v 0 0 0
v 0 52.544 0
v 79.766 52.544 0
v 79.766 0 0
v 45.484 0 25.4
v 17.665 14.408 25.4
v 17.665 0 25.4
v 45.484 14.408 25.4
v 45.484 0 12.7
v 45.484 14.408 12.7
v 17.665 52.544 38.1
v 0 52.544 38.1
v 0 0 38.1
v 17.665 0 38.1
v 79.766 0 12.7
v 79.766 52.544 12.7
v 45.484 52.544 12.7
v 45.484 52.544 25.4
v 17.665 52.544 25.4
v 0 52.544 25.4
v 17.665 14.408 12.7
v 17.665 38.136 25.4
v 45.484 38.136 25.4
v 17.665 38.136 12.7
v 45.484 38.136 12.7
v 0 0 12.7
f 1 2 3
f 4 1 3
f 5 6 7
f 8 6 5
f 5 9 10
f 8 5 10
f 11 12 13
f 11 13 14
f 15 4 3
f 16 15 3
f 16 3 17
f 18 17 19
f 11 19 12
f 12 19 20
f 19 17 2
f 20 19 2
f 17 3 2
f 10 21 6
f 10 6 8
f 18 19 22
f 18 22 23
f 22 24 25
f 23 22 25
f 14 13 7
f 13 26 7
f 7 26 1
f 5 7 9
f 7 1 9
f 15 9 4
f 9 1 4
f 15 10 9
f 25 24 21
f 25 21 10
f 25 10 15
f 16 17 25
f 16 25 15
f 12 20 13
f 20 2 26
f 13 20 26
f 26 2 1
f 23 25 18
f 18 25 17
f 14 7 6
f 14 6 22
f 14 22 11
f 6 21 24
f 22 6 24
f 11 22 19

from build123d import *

# Parameters (mm, degrees)
F0_W     = 79.766176641
F0_H     = 52.5435172021
F1_DEPTH = 12.7
F2_W     = 27.8192292899
F2_H     = 14.4076673314
F2_H_2   = 14.4076794386
F3_DEPTH = 12.7
F5_DEPTH = 12.7


with BuildPart() as f1:
    # F0 (on Top) → F1 (new body)
    with BuildSketch(Plane.XY):
        with Locations((39.8830883205, 26.2717586011)):
            Rectangle(F0_W, F0_H)
    extrude(amount=F1_DEPTH)

    # F2 (on face) → F3 (join)
    with BuildSketch(Plane.XY.offset(12.7)):
        Polygon((17.6650751382, 52.5435172021), (0, 52.5435172021), (0, 0), (17.6650751382, 0), (17.6650751382, 14.4076673314), (17.6650751382, 38.1358377635), align=None)
        with Locations((31.5746897832, 7.2038336657)):
            Rectangle(F2_W, F2_H)
        with Locations((31.5746897832, 45.3396774828)):
            Rectangle(F2_W, F2_H_2)
    extrude(amount=F3_DEPTH)

    # F4 (on face) → F5 (join)
    with BuildSketch(Plane.XY.offset(25.4)):
        Polygon((17.6650751382, 52.5435172021), (0, 52.5435172021), (0, 0), (17.6650751382, 0), (17.6650751382, 14.4076673314), (17.6650751382, 38.1358377635), align=None)
    extrude(amount=F5_DEPTH)


solid = f1.part
